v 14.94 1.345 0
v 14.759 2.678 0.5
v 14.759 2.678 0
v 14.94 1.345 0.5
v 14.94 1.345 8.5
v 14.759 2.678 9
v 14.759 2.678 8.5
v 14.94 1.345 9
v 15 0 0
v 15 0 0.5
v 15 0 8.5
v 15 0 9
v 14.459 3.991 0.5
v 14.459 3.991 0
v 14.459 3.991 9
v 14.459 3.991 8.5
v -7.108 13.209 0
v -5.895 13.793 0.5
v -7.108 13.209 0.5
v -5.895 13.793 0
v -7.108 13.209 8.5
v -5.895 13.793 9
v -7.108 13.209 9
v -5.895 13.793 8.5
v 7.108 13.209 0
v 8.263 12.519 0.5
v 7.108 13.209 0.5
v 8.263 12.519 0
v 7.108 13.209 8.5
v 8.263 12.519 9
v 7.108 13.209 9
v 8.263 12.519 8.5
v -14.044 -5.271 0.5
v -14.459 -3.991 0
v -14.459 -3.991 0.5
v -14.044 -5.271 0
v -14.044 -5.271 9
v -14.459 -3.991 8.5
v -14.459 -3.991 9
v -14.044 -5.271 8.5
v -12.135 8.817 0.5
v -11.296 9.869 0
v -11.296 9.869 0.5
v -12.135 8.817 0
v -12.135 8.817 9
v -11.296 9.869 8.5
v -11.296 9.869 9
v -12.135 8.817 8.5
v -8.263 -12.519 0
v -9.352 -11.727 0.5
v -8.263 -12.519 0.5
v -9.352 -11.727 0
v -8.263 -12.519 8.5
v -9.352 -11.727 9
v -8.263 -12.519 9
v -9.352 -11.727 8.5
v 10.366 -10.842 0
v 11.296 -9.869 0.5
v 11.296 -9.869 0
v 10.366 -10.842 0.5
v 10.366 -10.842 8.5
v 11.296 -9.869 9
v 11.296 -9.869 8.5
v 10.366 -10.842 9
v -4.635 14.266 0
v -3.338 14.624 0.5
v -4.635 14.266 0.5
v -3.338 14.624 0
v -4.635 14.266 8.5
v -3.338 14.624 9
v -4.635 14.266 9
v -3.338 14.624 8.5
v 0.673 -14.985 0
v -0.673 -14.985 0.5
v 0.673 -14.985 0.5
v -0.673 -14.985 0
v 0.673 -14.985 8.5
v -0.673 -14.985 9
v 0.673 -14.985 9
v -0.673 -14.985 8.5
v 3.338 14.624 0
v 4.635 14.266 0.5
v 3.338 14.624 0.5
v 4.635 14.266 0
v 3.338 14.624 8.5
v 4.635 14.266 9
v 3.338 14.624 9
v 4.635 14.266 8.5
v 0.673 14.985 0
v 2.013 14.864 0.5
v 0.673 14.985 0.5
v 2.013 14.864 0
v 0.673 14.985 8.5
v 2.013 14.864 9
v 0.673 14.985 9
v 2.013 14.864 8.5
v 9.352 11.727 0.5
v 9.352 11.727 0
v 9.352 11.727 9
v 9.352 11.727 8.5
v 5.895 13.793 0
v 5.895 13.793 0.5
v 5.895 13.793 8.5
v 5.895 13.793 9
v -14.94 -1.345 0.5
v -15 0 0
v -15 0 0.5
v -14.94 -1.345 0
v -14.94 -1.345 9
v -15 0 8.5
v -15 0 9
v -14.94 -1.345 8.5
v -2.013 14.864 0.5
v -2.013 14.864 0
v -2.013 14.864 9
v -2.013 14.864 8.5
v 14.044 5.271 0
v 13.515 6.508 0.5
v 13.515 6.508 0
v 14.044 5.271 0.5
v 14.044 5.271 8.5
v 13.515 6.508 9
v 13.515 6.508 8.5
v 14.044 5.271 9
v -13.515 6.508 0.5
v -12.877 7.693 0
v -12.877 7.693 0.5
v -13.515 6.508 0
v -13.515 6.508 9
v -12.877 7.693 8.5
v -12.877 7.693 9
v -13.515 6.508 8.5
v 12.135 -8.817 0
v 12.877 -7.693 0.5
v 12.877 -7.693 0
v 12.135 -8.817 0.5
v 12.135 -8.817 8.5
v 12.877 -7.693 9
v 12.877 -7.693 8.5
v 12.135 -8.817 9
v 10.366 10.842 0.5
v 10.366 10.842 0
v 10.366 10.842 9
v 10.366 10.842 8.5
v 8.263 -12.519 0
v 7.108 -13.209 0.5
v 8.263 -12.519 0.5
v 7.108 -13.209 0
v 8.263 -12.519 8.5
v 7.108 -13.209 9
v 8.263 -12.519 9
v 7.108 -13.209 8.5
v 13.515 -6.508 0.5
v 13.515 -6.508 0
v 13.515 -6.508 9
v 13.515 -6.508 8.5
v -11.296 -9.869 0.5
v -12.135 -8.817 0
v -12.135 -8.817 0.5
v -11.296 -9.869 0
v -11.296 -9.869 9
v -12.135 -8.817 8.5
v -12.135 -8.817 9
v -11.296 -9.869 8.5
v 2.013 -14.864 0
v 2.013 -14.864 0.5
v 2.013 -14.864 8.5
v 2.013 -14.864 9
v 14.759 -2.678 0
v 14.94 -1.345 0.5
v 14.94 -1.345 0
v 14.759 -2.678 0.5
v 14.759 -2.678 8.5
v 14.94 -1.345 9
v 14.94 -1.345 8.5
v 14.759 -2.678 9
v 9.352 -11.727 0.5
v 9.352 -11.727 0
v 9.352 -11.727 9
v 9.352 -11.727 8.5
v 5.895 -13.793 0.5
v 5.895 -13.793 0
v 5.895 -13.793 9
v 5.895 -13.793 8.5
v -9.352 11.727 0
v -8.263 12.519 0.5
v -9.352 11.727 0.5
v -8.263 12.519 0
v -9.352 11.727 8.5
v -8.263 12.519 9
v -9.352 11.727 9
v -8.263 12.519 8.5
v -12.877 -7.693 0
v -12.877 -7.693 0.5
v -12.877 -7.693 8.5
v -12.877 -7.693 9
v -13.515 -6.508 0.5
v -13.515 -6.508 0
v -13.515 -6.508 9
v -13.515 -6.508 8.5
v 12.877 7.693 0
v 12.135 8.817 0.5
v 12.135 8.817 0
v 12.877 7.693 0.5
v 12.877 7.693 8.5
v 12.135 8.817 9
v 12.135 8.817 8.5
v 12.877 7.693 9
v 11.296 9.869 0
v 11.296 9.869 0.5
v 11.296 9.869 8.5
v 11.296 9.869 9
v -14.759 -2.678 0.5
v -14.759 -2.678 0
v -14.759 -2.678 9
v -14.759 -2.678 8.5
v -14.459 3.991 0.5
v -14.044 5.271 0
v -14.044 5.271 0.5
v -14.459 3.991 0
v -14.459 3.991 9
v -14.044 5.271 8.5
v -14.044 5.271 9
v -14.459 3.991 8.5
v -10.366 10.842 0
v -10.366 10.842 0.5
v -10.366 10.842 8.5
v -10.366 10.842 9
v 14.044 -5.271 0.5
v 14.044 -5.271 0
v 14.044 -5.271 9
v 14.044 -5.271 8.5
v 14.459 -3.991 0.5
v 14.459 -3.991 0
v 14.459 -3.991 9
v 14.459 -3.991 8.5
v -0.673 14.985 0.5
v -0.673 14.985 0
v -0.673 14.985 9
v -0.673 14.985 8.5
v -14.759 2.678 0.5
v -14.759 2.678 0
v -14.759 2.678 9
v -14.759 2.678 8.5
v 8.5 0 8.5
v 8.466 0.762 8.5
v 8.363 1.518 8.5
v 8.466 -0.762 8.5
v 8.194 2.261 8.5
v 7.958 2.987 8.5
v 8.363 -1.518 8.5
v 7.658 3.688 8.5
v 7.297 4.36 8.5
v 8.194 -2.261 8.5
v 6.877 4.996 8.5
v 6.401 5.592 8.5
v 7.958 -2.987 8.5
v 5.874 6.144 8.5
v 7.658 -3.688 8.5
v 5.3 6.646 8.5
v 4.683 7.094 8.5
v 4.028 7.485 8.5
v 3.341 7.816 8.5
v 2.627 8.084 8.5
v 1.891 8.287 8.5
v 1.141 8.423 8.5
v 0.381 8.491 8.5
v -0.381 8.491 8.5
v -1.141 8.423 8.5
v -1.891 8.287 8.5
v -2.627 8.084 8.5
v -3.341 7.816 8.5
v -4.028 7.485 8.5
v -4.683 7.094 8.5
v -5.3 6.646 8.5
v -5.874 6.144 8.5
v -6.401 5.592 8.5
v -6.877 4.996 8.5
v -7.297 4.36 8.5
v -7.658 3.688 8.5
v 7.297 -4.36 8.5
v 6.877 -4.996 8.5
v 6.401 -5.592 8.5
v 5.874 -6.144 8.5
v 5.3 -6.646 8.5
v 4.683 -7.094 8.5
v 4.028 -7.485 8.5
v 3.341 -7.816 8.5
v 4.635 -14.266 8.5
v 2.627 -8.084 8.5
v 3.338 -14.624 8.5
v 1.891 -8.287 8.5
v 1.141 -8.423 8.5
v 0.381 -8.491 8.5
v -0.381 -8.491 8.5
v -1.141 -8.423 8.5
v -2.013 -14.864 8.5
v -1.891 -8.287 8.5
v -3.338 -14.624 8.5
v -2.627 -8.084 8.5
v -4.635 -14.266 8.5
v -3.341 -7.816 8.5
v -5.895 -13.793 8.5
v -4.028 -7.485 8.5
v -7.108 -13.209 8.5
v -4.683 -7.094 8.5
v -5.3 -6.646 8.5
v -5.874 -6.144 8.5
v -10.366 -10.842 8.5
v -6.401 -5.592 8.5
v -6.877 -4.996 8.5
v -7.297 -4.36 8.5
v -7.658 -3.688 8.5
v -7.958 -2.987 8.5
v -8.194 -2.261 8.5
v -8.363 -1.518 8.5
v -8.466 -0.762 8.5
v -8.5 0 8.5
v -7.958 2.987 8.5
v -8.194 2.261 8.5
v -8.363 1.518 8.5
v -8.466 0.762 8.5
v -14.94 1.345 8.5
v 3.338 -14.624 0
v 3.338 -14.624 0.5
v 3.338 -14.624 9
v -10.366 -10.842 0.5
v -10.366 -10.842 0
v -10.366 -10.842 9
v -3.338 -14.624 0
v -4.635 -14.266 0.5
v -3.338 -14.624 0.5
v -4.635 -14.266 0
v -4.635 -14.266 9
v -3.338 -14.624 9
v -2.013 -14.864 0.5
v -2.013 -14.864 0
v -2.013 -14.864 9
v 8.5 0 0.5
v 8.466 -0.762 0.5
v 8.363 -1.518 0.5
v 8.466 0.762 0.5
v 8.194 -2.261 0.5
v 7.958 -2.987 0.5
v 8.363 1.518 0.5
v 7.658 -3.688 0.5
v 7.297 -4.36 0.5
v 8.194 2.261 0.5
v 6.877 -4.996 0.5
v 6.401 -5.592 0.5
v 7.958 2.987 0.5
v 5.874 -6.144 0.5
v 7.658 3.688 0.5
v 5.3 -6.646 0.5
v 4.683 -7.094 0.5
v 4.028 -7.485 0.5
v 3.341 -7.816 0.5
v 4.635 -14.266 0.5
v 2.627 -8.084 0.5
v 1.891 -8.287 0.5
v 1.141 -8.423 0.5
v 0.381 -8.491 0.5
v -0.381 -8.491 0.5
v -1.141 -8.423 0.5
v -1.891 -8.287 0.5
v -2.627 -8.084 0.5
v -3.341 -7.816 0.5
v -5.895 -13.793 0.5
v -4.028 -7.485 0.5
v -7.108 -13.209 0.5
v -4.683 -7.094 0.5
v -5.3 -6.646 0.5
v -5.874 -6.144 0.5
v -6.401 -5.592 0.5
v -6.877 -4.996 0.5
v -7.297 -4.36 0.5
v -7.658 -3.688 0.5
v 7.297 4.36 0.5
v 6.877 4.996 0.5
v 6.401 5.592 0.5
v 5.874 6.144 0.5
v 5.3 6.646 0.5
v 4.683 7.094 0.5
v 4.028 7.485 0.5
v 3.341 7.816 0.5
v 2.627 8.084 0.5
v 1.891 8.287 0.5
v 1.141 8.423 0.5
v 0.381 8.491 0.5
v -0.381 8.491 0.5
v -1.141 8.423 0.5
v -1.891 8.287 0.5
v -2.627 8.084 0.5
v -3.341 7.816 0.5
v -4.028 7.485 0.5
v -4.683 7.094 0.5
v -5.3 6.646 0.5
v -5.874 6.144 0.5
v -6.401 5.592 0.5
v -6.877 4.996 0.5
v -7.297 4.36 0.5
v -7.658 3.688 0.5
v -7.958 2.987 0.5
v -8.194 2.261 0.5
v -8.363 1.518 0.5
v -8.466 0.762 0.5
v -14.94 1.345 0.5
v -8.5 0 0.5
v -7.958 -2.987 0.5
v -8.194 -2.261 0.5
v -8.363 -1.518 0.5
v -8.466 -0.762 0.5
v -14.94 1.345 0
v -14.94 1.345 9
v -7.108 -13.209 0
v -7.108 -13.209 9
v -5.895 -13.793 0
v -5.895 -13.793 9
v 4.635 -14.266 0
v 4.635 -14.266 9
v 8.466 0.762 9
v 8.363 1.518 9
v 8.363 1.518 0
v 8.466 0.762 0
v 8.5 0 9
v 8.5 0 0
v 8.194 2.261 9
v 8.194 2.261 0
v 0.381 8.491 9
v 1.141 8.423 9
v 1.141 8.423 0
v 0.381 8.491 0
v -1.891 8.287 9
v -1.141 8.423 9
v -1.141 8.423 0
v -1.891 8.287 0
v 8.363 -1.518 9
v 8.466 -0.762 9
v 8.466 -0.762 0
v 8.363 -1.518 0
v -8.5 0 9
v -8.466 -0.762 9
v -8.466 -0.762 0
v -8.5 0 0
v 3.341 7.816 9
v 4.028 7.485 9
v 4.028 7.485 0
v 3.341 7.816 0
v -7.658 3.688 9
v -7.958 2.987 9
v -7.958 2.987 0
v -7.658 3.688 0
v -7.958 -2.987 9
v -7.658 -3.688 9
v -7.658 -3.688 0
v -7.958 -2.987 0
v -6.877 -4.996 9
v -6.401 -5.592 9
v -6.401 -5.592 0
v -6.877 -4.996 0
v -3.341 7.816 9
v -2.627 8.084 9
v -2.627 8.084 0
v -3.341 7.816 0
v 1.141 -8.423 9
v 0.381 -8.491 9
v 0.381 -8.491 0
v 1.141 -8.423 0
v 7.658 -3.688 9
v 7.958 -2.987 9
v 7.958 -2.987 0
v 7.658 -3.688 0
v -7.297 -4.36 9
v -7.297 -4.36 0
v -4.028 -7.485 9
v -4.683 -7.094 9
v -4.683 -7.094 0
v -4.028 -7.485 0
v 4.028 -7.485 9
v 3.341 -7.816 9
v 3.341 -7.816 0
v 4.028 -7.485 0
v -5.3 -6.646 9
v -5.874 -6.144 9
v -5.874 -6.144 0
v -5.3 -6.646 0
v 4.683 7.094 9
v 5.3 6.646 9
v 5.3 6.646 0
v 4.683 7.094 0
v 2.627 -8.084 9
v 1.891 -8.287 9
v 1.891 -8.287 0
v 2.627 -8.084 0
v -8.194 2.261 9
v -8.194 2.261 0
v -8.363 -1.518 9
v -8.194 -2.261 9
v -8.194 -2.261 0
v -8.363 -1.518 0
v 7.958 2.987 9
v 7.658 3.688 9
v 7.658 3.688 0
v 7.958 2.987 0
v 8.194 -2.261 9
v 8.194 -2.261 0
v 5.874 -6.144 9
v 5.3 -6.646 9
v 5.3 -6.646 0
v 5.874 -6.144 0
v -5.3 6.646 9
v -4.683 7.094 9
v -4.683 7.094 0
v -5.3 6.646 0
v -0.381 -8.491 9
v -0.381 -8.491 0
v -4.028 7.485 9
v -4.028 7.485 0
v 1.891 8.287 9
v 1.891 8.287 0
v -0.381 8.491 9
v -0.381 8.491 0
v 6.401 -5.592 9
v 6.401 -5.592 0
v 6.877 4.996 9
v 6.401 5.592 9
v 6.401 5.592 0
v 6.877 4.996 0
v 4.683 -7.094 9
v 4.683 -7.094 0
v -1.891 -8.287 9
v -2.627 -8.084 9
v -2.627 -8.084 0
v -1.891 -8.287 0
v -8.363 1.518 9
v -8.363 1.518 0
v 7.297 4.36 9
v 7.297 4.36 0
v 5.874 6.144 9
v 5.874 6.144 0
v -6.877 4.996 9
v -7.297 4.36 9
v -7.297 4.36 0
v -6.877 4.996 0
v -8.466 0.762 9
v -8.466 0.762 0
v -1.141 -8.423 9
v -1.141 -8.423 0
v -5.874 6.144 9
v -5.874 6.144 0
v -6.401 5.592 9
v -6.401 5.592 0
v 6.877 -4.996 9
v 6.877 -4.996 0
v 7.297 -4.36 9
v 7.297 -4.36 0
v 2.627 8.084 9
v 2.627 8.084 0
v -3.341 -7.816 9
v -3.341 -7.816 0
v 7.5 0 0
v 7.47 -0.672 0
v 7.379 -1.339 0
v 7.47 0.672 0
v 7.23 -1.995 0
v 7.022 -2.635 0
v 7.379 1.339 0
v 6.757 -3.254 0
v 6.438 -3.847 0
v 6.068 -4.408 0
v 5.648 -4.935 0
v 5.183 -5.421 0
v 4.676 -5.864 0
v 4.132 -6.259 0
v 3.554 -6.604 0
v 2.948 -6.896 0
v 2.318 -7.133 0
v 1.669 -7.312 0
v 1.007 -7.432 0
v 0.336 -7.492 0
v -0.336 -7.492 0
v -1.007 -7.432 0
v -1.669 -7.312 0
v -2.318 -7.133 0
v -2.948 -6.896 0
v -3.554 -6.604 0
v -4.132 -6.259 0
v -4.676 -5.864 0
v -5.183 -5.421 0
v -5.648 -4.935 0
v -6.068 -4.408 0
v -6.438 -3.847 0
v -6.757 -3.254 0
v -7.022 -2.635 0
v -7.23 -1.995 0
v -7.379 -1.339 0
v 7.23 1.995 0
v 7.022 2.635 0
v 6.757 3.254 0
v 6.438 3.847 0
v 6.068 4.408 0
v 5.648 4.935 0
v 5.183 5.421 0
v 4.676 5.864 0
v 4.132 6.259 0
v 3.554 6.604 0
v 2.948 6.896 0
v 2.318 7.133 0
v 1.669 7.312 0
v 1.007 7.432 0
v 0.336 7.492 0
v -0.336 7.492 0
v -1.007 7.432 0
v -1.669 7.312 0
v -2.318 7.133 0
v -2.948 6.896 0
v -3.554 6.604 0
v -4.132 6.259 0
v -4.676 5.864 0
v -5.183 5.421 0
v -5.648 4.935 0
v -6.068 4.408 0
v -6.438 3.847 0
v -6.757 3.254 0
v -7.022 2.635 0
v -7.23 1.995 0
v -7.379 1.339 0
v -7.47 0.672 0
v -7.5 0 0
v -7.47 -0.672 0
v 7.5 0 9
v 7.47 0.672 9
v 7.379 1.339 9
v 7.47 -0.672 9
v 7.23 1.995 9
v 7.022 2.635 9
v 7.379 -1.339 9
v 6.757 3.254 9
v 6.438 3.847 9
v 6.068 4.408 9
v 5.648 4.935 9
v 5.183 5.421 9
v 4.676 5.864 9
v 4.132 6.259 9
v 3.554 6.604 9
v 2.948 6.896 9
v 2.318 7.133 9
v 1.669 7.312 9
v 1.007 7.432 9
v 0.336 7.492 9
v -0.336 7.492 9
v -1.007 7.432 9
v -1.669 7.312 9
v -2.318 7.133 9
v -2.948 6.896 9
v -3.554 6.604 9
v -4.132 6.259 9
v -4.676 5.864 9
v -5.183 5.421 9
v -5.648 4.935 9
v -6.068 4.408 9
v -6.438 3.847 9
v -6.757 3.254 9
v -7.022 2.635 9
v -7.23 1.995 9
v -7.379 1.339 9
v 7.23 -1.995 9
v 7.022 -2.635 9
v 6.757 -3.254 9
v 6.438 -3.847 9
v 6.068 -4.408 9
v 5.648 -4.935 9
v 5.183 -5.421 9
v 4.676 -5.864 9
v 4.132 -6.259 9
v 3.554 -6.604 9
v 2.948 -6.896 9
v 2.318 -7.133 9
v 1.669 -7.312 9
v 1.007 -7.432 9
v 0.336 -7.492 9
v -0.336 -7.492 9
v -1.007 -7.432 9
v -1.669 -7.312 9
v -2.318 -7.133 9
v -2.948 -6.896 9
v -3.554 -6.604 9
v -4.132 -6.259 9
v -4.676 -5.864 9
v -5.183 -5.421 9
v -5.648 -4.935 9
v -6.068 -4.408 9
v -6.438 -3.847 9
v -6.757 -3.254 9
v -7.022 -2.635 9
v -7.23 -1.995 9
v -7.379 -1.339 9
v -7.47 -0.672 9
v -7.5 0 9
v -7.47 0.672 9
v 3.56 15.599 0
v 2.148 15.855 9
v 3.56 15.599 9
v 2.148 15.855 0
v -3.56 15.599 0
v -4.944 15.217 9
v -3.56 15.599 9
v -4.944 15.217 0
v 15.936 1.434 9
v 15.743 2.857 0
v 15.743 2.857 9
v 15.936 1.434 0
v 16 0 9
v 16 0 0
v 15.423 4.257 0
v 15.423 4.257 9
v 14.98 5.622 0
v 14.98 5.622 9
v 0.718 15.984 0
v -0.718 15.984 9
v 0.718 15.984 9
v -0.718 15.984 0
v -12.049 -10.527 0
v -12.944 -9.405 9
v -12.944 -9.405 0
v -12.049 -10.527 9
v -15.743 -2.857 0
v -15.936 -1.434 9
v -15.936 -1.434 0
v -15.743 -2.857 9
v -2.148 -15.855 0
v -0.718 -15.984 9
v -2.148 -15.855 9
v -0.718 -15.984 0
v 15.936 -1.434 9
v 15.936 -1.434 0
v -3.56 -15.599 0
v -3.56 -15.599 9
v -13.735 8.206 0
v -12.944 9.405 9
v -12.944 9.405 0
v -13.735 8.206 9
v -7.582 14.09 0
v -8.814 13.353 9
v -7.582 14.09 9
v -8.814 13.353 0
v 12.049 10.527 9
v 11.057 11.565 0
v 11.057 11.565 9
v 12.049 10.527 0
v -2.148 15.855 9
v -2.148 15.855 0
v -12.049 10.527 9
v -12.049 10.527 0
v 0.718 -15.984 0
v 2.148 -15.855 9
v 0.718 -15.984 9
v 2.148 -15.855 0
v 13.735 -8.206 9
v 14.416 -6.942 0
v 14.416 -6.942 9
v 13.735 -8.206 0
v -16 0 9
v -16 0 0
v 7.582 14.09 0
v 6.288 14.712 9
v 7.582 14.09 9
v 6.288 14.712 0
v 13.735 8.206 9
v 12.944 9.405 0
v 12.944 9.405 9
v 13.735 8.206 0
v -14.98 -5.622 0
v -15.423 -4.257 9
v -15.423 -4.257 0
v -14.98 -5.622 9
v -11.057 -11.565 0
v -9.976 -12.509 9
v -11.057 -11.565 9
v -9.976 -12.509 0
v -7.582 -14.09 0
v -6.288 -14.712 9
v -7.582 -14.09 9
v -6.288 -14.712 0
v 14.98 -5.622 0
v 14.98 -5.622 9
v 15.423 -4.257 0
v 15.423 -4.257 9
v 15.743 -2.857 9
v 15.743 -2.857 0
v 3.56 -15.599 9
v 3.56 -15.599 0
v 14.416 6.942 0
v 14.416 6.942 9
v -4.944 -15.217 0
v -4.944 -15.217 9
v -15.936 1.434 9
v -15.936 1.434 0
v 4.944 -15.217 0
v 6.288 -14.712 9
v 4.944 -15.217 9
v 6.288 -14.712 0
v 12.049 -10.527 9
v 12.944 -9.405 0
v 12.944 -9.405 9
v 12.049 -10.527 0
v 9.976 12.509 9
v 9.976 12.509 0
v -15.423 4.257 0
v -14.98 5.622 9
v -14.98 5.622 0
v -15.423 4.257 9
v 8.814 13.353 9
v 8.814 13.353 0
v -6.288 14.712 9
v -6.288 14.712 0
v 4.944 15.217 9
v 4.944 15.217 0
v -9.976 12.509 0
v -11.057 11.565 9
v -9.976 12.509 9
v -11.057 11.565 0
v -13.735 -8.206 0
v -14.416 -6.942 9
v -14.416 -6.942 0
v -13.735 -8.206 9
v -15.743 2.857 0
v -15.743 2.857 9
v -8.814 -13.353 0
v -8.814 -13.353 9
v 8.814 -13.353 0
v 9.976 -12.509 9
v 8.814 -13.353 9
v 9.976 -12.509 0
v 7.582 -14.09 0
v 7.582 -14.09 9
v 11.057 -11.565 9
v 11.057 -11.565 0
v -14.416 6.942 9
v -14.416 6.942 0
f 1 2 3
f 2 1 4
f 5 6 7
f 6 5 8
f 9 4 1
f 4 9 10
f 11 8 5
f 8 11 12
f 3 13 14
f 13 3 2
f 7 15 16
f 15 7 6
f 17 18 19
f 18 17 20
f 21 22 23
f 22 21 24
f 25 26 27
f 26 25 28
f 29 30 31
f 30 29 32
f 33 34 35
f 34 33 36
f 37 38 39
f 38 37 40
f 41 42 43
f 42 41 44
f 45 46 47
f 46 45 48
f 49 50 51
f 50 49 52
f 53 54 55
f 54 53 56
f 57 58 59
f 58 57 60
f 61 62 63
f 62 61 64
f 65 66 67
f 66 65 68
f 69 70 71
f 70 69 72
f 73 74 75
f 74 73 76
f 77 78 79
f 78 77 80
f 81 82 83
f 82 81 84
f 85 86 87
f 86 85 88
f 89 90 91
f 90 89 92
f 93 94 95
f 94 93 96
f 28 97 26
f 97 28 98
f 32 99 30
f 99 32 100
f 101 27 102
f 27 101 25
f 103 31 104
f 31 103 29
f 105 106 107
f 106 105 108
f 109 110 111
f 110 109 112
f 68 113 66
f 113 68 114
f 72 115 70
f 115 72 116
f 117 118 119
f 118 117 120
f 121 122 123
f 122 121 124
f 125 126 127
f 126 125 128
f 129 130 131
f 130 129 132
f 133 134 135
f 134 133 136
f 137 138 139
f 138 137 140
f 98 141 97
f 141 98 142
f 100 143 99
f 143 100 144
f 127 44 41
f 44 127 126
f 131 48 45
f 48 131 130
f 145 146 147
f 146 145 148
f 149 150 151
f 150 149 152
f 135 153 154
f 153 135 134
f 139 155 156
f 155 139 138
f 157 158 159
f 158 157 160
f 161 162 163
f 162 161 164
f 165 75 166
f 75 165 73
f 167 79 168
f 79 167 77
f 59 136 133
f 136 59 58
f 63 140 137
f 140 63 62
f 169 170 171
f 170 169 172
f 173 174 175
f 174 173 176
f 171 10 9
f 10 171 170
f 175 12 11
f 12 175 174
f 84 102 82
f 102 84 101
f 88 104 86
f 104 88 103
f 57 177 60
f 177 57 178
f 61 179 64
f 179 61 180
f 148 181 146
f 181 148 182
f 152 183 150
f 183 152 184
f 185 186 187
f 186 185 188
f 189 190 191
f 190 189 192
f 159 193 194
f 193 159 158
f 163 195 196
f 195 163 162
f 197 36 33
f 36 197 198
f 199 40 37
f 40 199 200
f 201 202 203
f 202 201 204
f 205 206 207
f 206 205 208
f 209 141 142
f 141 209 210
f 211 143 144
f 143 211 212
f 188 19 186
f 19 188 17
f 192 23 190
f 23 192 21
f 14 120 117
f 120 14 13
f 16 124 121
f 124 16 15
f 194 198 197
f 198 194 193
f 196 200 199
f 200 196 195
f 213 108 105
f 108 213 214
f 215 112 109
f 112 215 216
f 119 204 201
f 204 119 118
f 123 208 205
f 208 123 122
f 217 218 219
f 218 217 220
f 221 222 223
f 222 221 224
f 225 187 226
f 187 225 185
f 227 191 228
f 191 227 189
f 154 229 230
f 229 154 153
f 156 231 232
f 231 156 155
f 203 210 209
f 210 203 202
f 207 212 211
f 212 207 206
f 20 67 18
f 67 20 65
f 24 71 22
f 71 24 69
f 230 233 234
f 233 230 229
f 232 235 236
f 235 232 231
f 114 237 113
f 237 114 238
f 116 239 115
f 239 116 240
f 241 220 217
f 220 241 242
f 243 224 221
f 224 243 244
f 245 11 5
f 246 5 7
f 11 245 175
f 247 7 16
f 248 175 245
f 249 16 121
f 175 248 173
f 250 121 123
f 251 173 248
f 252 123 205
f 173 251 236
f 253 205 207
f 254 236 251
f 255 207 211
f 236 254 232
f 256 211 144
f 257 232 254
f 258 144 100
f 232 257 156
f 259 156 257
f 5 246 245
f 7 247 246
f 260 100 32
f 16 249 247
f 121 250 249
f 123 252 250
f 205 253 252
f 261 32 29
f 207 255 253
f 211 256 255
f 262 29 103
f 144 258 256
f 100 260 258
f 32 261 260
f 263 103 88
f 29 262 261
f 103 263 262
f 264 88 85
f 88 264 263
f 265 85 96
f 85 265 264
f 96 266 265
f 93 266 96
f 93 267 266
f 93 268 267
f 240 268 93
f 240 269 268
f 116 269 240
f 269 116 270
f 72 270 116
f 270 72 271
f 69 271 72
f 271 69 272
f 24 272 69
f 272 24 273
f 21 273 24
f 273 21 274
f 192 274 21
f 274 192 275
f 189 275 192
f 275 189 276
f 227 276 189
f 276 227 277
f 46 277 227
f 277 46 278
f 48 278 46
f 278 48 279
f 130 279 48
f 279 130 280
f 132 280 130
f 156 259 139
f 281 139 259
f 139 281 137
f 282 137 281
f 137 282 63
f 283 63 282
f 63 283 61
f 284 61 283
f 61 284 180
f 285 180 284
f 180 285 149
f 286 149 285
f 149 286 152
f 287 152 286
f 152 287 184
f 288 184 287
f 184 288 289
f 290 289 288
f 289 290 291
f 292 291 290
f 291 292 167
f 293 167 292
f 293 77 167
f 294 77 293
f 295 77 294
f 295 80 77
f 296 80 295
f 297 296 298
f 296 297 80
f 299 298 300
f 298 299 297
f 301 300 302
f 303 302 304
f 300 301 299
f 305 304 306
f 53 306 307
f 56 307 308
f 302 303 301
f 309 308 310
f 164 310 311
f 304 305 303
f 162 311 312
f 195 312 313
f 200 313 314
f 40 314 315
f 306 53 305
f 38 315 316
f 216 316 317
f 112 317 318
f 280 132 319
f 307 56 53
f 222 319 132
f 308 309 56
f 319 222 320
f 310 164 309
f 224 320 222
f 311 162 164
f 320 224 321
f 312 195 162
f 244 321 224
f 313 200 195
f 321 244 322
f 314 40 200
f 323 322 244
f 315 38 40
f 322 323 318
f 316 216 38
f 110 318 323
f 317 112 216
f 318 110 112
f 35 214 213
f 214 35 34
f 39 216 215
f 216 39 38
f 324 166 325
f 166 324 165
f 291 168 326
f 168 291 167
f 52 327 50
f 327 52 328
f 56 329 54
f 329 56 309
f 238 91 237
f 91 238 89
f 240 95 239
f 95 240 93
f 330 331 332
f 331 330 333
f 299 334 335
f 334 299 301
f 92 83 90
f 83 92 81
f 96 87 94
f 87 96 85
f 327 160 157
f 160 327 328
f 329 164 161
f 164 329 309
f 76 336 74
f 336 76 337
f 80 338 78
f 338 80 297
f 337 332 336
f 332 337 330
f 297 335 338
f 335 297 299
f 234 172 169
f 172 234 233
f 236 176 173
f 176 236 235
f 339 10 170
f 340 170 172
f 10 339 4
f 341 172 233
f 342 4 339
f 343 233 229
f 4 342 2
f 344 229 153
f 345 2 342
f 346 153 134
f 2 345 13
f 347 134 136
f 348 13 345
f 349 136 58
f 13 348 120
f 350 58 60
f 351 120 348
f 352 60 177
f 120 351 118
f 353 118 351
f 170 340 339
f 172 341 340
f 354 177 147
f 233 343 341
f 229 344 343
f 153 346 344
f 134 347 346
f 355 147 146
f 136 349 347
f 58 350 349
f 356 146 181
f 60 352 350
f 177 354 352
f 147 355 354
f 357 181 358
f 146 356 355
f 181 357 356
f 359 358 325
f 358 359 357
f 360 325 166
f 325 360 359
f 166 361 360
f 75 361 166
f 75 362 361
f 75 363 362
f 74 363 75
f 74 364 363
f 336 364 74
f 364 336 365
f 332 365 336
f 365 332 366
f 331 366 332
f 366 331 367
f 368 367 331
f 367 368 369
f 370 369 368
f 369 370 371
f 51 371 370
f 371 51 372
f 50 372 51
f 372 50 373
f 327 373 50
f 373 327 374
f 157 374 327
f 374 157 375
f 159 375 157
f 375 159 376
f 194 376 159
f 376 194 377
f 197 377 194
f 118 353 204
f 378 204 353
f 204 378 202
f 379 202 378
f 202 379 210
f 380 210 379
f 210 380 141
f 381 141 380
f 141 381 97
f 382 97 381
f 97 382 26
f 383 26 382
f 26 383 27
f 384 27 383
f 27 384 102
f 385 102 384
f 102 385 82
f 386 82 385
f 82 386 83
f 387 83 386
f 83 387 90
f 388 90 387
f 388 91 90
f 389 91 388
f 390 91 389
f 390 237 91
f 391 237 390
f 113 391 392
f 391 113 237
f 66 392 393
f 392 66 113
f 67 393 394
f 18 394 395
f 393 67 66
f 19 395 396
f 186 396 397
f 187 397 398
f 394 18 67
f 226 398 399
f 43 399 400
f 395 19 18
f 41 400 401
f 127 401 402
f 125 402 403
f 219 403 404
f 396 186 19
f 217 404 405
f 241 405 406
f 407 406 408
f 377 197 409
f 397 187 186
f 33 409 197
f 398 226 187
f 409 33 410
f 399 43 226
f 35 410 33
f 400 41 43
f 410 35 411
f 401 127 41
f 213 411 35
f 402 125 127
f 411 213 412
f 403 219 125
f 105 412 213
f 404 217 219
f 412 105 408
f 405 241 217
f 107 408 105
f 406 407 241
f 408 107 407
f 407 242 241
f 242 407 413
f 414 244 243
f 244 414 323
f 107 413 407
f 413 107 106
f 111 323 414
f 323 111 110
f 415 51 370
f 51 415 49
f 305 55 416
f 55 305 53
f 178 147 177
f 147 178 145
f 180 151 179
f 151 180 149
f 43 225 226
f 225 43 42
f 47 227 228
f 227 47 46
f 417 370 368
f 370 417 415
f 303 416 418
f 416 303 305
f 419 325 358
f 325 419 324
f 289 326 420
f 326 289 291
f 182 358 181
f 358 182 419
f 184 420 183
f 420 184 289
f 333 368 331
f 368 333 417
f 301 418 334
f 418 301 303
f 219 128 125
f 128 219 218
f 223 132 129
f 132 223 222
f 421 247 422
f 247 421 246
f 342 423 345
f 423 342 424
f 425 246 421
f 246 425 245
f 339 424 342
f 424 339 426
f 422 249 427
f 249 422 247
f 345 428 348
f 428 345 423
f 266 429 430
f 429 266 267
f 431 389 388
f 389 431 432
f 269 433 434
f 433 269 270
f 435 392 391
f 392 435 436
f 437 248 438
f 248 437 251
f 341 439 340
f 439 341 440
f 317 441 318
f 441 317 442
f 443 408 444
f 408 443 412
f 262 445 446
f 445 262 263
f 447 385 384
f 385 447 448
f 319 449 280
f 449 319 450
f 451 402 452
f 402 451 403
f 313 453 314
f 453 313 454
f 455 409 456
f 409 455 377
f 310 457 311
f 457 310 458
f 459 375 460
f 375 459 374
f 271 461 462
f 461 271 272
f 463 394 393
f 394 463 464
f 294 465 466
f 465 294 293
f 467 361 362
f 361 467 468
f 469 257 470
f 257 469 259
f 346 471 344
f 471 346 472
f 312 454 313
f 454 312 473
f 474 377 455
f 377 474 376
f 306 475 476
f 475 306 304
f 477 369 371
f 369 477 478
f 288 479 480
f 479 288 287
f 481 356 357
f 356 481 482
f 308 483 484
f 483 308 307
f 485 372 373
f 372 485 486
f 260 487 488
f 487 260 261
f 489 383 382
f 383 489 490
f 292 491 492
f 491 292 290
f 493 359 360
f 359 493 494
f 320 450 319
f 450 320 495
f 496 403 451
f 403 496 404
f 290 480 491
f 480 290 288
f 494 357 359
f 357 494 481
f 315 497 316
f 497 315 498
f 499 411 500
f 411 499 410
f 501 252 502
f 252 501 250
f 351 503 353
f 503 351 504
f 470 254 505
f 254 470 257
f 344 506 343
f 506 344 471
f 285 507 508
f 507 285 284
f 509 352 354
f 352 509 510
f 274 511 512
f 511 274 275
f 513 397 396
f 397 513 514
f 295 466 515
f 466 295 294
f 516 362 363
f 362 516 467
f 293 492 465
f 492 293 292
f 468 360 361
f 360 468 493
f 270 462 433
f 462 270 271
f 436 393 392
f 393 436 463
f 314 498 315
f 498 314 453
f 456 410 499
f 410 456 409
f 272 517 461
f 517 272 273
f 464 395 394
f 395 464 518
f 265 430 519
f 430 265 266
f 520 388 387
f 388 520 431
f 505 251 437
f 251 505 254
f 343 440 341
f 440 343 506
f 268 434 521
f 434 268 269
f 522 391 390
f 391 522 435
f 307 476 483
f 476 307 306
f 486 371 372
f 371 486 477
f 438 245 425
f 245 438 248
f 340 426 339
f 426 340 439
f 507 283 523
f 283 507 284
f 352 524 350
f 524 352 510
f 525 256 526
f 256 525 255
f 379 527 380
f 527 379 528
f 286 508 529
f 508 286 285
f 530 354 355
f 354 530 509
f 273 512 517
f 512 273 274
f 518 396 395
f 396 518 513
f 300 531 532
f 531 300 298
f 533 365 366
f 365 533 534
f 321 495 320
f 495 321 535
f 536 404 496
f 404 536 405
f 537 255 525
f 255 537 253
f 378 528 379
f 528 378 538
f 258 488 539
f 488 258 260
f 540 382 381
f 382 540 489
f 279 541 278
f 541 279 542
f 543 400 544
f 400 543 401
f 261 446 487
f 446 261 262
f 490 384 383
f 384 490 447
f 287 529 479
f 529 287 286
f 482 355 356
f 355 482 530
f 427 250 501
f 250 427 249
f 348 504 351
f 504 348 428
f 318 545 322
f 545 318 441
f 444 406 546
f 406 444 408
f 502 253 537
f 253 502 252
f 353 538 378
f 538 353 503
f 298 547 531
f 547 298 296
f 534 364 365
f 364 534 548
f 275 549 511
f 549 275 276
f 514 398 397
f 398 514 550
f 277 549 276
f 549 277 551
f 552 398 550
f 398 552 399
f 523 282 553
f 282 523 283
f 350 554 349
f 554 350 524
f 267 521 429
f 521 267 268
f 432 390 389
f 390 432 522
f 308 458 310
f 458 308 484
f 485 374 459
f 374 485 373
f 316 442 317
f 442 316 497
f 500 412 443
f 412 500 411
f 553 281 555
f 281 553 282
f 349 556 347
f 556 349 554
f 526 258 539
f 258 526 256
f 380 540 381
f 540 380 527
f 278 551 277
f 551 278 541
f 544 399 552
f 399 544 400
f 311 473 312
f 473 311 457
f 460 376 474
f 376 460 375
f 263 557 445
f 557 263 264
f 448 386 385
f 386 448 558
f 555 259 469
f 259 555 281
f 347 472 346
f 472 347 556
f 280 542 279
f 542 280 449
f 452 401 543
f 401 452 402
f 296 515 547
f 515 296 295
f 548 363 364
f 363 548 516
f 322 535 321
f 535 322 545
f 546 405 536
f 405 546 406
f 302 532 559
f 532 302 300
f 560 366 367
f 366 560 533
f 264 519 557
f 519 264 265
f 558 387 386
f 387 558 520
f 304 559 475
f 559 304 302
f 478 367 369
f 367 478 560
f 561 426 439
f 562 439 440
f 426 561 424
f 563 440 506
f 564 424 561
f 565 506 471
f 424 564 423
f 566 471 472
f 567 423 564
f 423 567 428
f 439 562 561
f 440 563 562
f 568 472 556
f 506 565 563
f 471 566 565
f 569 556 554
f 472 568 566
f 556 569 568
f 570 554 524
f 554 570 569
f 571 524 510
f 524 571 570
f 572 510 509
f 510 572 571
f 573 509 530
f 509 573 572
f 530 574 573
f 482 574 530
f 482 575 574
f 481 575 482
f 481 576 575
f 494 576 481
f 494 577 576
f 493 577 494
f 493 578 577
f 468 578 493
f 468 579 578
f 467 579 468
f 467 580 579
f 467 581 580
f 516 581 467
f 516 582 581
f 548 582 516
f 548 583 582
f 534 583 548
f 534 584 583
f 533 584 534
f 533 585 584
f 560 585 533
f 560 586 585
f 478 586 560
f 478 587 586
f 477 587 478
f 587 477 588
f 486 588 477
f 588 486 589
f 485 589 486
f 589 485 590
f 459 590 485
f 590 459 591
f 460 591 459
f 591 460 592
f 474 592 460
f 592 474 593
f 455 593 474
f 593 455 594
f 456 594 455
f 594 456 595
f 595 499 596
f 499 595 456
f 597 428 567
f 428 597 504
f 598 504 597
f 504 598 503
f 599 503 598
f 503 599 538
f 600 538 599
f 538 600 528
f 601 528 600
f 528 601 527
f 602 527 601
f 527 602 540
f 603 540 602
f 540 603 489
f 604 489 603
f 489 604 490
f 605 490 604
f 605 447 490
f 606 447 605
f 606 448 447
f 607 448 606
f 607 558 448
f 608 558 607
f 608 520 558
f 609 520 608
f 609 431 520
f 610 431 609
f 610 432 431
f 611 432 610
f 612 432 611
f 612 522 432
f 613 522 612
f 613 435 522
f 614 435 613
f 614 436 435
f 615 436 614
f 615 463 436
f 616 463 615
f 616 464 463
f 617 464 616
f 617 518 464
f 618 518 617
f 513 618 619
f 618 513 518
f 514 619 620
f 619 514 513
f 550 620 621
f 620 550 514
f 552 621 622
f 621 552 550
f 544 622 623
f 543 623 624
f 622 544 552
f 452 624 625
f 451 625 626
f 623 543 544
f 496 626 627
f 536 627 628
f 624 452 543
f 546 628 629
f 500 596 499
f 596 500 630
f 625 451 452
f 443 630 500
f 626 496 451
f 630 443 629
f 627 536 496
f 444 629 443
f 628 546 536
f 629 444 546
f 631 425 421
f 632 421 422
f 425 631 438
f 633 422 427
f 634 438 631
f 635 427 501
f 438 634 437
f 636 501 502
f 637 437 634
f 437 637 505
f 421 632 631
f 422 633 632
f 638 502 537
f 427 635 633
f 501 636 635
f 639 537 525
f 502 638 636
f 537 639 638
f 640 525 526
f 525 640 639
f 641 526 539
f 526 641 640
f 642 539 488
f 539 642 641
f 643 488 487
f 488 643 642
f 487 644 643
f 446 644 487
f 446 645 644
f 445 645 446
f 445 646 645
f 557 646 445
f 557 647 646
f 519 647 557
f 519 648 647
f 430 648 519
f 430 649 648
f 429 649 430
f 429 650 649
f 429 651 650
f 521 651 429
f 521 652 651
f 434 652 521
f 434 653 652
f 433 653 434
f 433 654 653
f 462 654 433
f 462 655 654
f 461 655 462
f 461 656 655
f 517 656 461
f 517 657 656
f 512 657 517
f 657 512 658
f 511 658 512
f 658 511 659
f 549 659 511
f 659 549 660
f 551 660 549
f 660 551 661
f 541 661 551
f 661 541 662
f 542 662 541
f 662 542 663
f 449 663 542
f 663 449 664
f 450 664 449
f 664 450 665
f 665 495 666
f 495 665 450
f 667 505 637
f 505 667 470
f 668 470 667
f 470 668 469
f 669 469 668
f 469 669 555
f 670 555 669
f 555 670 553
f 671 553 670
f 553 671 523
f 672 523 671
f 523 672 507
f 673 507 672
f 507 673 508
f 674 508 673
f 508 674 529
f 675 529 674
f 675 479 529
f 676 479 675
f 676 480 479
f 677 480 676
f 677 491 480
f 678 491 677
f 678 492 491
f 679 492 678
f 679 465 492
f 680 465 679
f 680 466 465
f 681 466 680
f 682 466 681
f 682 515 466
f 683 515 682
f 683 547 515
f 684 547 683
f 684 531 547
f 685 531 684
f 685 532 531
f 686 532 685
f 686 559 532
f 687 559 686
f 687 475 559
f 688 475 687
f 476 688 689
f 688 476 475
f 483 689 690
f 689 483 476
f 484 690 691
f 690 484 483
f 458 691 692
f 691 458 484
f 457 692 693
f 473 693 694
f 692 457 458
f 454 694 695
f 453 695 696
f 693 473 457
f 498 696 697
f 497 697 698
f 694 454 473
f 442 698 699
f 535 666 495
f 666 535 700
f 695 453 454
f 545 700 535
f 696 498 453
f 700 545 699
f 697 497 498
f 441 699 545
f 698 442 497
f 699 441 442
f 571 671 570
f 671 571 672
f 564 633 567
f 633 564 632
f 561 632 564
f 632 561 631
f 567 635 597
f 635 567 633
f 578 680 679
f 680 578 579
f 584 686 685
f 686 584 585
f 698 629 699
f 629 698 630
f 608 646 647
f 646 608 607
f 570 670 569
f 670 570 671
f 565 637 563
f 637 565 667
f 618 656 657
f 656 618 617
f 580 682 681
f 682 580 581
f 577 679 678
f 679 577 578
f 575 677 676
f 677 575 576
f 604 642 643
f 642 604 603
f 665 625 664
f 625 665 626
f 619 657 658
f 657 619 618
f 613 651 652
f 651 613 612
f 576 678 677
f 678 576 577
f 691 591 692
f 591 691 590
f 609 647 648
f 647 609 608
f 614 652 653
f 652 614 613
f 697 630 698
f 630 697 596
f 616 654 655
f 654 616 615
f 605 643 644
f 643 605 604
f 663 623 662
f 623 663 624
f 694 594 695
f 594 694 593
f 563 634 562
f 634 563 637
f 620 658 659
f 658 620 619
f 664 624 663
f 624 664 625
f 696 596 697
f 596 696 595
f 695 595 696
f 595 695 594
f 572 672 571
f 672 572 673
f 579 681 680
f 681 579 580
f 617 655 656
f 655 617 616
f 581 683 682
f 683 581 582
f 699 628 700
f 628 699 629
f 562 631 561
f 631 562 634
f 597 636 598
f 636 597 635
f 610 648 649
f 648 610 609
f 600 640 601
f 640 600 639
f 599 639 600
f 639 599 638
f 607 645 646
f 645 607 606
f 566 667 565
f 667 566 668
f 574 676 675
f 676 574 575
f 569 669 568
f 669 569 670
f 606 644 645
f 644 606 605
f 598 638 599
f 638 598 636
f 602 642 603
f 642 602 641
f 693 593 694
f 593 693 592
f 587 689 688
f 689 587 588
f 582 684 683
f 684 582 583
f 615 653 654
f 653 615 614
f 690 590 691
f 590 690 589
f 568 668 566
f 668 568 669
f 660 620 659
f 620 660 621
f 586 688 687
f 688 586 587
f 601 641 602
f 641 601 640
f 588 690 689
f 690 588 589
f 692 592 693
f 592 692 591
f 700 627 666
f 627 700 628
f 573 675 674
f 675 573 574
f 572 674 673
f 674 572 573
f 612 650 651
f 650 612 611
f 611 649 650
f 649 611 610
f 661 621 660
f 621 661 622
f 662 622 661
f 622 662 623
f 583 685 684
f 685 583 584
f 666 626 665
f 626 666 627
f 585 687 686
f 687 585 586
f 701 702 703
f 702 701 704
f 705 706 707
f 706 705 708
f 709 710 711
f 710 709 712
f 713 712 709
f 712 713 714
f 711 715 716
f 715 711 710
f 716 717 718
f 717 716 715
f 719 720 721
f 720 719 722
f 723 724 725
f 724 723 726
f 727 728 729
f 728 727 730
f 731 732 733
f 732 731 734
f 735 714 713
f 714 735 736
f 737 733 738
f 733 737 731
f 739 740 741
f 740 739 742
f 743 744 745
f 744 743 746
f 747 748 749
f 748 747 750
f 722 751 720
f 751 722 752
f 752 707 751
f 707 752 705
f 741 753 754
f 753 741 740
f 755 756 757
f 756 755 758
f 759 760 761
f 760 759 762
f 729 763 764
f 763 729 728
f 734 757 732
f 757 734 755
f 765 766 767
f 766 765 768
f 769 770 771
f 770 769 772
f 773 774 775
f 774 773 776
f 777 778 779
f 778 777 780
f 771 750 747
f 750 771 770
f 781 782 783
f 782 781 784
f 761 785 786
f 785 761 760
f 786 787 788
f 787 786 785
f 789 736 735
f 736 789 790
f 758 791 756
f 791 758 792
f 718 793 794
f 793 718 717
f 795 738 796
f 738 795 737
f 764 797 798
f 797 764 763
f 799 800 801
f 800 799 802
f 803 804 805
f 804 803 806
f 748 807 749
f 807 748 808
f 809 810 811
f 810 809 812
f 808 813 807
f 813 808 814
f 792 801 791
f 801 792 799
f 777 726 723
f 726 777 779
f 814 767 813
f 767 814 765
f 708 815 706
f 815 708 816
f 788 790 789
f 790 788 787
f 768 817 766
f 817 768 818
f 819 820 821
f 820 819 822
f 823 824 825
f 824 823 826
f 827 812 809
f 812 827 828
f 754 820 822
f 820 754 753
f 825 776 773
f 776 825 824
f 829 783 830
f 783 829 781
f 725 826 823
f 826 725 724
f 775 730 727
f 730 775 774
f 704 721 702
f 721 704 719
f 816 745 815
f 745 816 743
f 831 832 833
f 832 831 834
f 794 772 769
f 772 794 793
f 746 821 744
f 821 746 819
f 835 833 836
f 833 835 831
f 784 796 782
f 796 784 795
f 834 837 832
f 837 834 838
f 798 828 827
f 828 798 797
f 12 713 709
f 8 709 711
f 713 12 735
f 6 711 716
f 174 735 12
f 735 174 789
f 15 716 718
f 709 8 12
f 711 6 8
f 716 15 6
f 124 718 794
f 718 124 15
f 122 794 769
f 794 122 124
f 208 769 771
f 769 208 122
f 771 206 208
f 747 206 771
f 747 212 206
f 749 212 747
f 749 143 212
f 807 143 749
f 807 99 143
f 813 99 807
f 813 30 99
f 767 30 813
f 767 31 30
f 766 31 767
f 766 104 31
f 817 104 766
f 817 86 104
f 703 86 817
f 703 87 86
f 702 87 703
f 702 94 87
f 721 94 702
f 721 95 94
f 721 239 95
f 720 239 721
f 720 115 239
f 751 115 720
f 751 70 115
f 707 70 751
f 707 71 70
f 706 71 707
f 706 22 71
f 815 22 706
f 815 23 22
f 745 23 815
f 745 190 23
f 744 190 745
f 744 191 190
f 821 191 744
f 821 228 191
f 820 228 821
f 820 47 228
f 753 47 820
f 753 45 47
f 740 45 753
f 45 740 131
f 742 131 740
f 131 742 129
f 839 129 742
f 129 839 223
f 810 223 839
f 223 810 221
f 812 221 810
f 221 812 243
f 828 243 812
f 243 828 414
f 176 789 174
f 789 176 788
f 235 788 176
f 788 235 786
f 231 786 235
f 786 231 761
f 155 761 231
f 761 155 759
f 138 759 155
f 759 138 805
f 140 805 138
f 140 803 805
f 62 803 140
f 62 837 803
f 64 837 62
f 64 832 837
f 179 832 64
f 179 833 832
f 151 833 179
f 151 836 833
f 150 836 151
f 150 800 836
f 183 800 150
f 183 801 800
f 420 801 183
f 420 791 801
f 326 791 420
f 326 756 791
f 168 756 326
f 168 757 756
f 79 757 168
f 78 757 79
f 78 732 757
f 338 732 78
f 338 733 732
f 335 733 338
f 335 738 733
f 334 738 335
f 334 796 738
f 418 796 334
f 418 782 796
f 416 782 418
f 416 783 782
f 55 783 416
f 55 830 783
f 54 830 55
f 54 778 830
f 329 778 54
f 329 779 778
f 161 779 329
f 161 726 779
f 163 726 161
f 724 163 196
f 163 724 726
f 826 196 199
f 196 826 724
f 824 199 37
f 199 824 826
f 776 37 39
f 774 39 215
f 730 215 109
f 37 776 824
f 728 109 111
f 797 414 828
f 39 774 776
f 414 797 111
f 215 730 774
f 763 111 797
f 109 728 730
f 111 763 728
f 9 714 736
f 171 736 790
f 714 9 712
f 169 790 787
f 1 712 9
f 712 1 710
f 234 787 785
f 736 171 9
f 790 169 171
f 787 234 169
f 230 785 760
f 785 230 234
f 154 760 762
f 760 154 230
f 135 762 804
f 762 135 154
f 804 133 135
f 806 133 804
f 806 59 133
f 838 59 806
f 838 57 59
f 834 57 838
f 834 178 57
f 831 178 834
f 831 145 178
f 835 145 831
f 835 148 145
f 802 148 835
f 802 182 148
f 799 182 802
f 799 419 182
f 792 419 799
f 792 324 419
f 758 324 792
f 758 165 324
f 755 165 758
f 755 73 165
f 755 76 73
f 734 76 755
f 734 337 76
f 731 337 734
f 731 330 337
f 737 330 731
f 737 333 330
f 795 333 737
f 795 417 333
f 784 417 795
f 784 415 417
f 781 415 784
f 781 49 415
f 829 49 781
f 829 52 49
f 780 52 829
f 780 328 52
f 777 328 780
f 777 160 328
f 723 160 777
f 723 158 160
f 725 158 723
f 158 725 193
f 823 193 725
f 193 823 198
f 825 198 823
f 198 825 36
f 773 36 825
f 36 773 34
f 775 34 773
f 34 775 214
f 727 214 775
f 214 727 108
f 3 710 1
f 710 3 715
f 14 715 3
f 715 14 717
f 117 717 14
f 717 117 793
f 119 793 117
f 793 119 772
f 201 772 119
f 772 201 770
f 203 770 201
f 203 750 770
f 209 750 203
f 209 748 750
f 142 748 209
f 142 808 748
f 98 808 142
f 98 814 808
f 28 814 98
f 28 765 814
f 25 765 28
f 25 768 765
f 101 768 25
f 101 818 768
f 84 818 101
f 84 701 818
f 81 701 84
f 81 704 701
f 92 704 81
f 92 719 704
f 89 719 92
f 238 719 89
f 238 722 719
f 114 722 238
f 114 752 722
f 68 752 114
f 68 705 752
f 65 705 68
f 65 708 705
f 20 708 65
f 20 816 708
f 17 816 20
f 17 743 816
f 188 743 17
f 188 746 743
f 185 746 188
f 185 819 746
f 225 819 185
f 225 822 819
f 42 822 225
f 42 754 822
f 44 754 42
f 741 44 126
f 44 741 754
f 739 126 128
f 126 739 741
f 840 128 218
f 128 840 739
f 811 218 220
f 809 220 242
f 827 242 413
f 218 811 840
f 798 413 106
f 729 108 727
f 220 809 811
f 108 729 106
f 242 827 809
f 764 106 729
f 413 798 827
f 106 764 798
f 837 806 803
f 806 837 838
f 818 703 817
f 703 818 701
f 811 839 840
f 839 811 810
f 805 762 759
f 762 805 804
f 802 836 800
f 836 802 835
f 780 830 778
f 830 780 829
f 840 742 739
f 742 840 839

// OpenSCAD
// file: config.scad
// Author: Mihai Oltean, www.tcreate.org, mihai.oltean@gmail.com
// More details: jenny5.org
// Source: github.com/jenny5-robot
// MIT License
//--------------------------------------------------------------

aluminium_color = "Silver";
screw_color = "LightSlateGray";
frame_color = aluminium_color;
shaft_color = "Silver";
plastic_color = "LimeGreen";
pulley_color = "DarkSlateGray";
steel_color = "LightSlateGray";
// file: utils.scad
// Author: Mihai Oltean, www.tcreate.org, mihai.oltean@gmail.com
// More details: jenny5.org
// Source: github.com/jenny5-robot
// MIT License
//--------------------------------------------------------------

module colt(radius, height)
{
	difference(){
		cube ([radius, radius, height]);
		cylinder	(h = height, r = radius, $fn = 30);
	}
}
/////////////////////////////////////////////////////////////////////////////////////////////////////////////////////////
module colt_sferic(radius)
{
	difference(){
		cube ([radius, radius, radius]);
		sphere(r = radius, $fn = 40);
	}
}
/////////////////////////////////////////////////////////////////////////////////////////////////////////////////////////
module coloana_sferica(height, radius)
{
		difference(){
			cube ([height, height, height]);
			cylinder(h= height, r = radius, $fn = 50);
		}
}
/////////////////////////////////////////////////////////////////////////////////////////////////////////////////////////
// file: params_screws_nuts_washers.scad
// Author: Mihai Oltean, www.tcreate.org, mihai.oltean@gmail.com
// More details: jenny5.org
// Source: github.com/jenny5-robot
// MIT License
//--------------------------------------------------------------


m2_screw_radius = 1;
m2_nut_radius = 2.2;
m2_nut_height = 1.6;
m2_nut_thick = m2_nut_height;

m3_screw_radius = 1.5;
m3_nut_radius = 3.1;
m3_nut_height = 2.3;
m3_nut_thick = m3_nut_height;
m3_autolock_nut_thick = 4.2;

m4_screw_radius = 2;
m4_nut_radius = 4;
m4_auto_lock_nut_height = 5;
m4_nut_height = 3.25;
m4_nut_thick = 3.25;

m5_screw_radius = 2.5;
m5_nut_radius = 4.6;
m5_nut_height = 4;

m6_screw_radius = 3;
m6_nut_radius = 5.65;
m6_nut_thick = 5;
m6_nut_slim_thick = 3;
m6_autolock_nut_thick = 6;
m6_long_nut_thick = 9;

m8_screw_head_height = 5.7;
m8_screw_radius = 3.9;
m8_nut_small_width = 12.8;
m8_nut_radius = 7.3;
m8_slim_nut_small_width = 12.4;
m8_nut_thick = 6.5;
m8_nut_height = m8_nut_thick;
m8_slim_nut_height = 5.5;
m8_screw_head_radius = 6.5;
m8_autolock_nut_thick = 8;

m10_screw_radius = 5;
m10_nut_thick = 8;
m10_nut_radius = 9.8;

M12_screw_radius = 6;
M12_nut_thick = 10;
M12_nut_radius = 11;
M12_long_long_nut_thick = 36;
M12_long_nut_thick = 36;
M12_autolock_nut_thick = 14;

m10_long_nut_radius = 9.71;
m10_long_nut_height = 29.8;

m10_long_thick_nut_radius = 7.41;
m10_long_thick_nut_height = 30.4;

m12_plastic_nut_radius = 10.45;
m12_plastic_nut_height = 23.3;

tr12_3_nut_radius = 11;
tr12_3_nut_height = 18.1;

washer_5 = 0.97;

washer_4_12_radius = 6;
washer_4_12_external_radius = 6;
washer_4_12_thick = 1;
washer_4_thick = 1;
washer_4_12_internal_radius = 2.15;

washer_4_9_external_radius = 4.5;
washer_4_9_internal_radius = 2.15;
washer_4_9_thick = 1;

washer_6_thick = 1.7;
washer_8_thick = 1.5;
washer_5_thick = 1;

washer_10_height = 2;
washer_10_thick = 2;

washer_12_thick = 2;

washer_5_15_external_radius = 7.5;
washer_5_15_thick = 1;
washer_5_thick = 1;
washer_5_15_internal_radius = 2.65;
// file: params_basic_components.scad
// Author: Mihai Oltean, www.tcreate.org, mihai.oltean@gmail.com
// More details: jenny5.org
// Source: github.com/jenny5-robot
// MIT License
//--------------------------------------------------------------

spring_length = 20;

smooth_rod_8_radius = 4;
smooth_rod_10_radius = 5;
smooth_rod_12_radius = 6;

tolerance = 0.1;
display_tolerance = 1;

overlap_tolerance = 0.01;

wall_thick_1 = 1;
wall_thick_2 = 2;
wall_thick_3 = 3;
wall_thick_4 = 4;
wall_thick_5 = 5;
wall_thick_5_5 = 5.5;
wall_thick_6 = 6;
wall_thick_7 = 7;
wall_thick_8 = 8;
wall_thick_9 = 9;
wall_thick_10 = 10;
wall_thick_12 = 10;

tolerance_z = [0, 0, tolerance];
tolerance_x = [tolerance, 0, 0];
tolerance_y = [0, tolerance, 0];

display_tolerance_z = [0, 0, display_tolerance];
display_tolerance_x = [display_tolerance, 0, 0];
display_tolerance_y = [0, display_tolerance, 0];

display_tolerance_xz = [display_tolerance, 0, display_tolerance];
display_tolerance_xy = [display_tolerance, display_tolerance, 0];
display_tolerance_yz = [0, display_tolerance, display_tolerance];

display_tolerance_xyz = [display_tolerance, display_tolerance, display_tolerance];
// file: params_radial_bearings.scad
// Author: Mihai Oltean, www.tcreate.org, mihai.oltean@gmail.com
// More details: jenny5.org
// Source: github.com/jenny5-robot
// MIT License
//--------------------------------------------------------------

bearing_4_external_radius = 6.5;
bearing_4_height = 5;

bearing_5_external_radius = 8;
bearing_5_internal_radius = 2.5;
bearing_5_thick = 5;
bearing_5_height = 5;

bearing_6_internal_radius = 3;
bearing_6_external_radius = 9.5;
bearing_6_thick = 6;
bearing_6_height = 6;

bearing_8_internal_radius = 4;
bearing_8_external_radius = 11;
bearing_8_height = 7;

bearing_10_internal_radius = 5;
bearing_10_external_radius = 13;
bearing_10_height = 8;

radial_bearing_4_external_radius = 6.5;
radial_bearing_4_height = 5;

radial_bearing_5_external_radius = 8;
radial_bearing_5_internal_radius = 2.5;
radial_bearing_5_thick = 5;
radial_bearing_5_height = 5;

radial_bearing_6_internal_radius = 3;
radial_bearing_6_external_radius = 9.5;
radial_bearing_6_thick = 6;
radial_bearing_6_height = 6;

radial_bearing_8_internal_radius = 4;
radial_bearing_8_external_radius = 11;
radial_bearing_8_height = 7;

radial_bearing_10_internal_radius = 5;
radial_bearing_10_external_radius = 13;
radial_bearing_10_height = 8;

rb_6002_internal_radius = 7.5;
rb_6002_external_radius = 16;
rb_6002_thick = 9;

rb_624_internal_radius = 2;
rb_624_external_radius = 6.5;
rb_624_thick = 5;

rb_625_internal_radius = 2.5;
rb_625_external_radius = 8;
rb_625_thick = 5;

rb_626_internal_radius = 3;
rb_626_external_radius = 9.5;
rb_626_thick = 6;

rb_608_internal_radius = 4;
rb_608_external_radius = 11;
rb_608_thick = 7;

rb_698_internal_radius = 4;
rb_698_external_radius = 9.5;
rb_698_thick = 6;

rb_688_internal_radius = 4;
rb_688_external_radius = 8;
rb_688_thick = 4;

rb_6000_internal_radius = 5;
rb_6000_external_radius = 13;
rb_6000_thick = 8;

rb_6001_internal_radius = 6;
rb_6001_external_radius = 14;
rb_6001_thick = 8;

rb_6201_internal_radius = 6;
rb_6201_external_radius = 16;
rb_6201_thick = 10;

rb_6002_internal_radius = 7.5;
rb_6002_external_radius = 16;
rb_6002_thick = 9;

rb_6902_internal_radius = 7.5;
rb_6902_external_radius = 14;
rb_6902_thick = 7;


rb_6005_internal_radius = 12.5;
rb_6005_external_radius = 23.5;
rb_6005_thick = 12;

rb_6006_internal_radius = 15;
rb_6006_external_radius = 27.5;
rb_6006_thick = 13;

rb_3205_internal_radius = 12.5;
rb_3205_external_radius = 26;
rb_3205_thick = 20.6;

rb_6905_internal_radius = 12.5;
rb_6905_external_radius = 21;
rb_6905_thick = 9;

rb_6906_internal_radius = 15;
rb_6906_external_radius = 23.5;
rb_6906_thick = 9;
// main file
// Author: Mihai Oltean, www.tcreate.org, mihai.oltean@gmail.com
// More details: jenny5.org
// Source: github.com/jenny5-robot
// MIT License
//--------------------------------------------------------------

include <params_radial_bearings.scad>
use <basic_components.scad>

////////////////////////////////////////////////////////////////
module radial_bearing(internal_radius, external_radius, height)
{
	union(){
		translate ([0, 0, 0.5]) color ("black") cylinder_empty(height  - 1, external_radius - 1, internal_radius + 1, 70);
		color ("Gainsboro") cylinder_empty(height, internal_radius + 1, internal_radius, 70);
		color ("Gainsboro") cylinder_empty(height, external_radius, external_radius - 1, 70);
	}
}
////////////////////////////////////////////////////////////////
module 624rs()
{
	radial_bearing(2, bearing_4_external_radius, bearing_4_height);
}
////////////////////////////////////////////////////////////////
module 628rs()
{
	radial_bearing(4, bearing_8_external_radius, bearing_8_height);
}
////////////////////////////////////////////////////////////////
module 625rs()
{
	radial_bearing(2.5, bearing_5_external_radius, bearing_5_height);
}
////////////////////////////////////////////////////////////////
module 626rs()
{
	radial_bearing(3, bearing_6_external_radius, bearing_6_height);
}
////////////////////////////////////////////////////////////////
module 6001rs()
{
	radial_bearing(rb_6001_internal_radius, rb_6001_external_radius, rb_6001_thick);
}
////////////////////////////////////////////////////////////////
module 6201rs()
{
	radial_bearing(rb_6201_internal_radius, rb_6201_external_radius, rb_6201_thick);
}
////////////////////////////////////////////////////////////////
module 6002rs()
{
	radial_bearing(rb_6002_internal_radius, rb_6002_external_radius, rb_6002_thick);
}
////////////////////////////////////////////////////////////////
module 6005rs()
{
	radial_bearing(rb_6005_internal_radius, rb_6005_external_radius, rb_6005_thick);
}
////////////////////////////////////////////////////////////////
module 6905rs()
{
	radial_bearing(rb_6905_internal_radius, rb_6905_external_radius, rb_6905_thick);
}
////////////////////////////////////////////////////////////////
module 608rs()
{
	radial_bearing(rb_608_internal_radius, rb_608_external_radius, rb_608_thick);
}
////////////////////////////////////////////////////////////////
module 698rs()
{
	radial_bearing(rb_698_internal_radius, rb_698_external_radius, rb_698_thick);
}
////////////////////////////////////////////////////////////////
module 6000rs()
{
	radial_bearing(rb_6000_internal_radius, rb_6000_external_radius, rb_6000_thick);
}
////////////////////////////////////////////////////////////////
module 6902rs()
{
	radial_bearing(rb_6902_internal_radius, rb_6902_external_radius, rb_6902_thick);
}
////////////////////////////////////////////////////////////////
module 6006rs()
{
	radial_bearing(rb_6006_internal_radius, rb_6006_external_radius, rb_6006_thick);
}
////////////////////////////////////////////////////////////////
module 6906rs()
{
	radial_bearing(rb_6906_internal_radius, rb_6906_external_radius, rb_6906_thick);
}
////////////////////////////////////////////////////////////////
module 3205rs()
{
	radial_bearing(rb_3205_internal_radius, rb_3205_external_radius, rb_3205_thick);
}
////////////////////////////////////////////////////////////////

6002rs();
